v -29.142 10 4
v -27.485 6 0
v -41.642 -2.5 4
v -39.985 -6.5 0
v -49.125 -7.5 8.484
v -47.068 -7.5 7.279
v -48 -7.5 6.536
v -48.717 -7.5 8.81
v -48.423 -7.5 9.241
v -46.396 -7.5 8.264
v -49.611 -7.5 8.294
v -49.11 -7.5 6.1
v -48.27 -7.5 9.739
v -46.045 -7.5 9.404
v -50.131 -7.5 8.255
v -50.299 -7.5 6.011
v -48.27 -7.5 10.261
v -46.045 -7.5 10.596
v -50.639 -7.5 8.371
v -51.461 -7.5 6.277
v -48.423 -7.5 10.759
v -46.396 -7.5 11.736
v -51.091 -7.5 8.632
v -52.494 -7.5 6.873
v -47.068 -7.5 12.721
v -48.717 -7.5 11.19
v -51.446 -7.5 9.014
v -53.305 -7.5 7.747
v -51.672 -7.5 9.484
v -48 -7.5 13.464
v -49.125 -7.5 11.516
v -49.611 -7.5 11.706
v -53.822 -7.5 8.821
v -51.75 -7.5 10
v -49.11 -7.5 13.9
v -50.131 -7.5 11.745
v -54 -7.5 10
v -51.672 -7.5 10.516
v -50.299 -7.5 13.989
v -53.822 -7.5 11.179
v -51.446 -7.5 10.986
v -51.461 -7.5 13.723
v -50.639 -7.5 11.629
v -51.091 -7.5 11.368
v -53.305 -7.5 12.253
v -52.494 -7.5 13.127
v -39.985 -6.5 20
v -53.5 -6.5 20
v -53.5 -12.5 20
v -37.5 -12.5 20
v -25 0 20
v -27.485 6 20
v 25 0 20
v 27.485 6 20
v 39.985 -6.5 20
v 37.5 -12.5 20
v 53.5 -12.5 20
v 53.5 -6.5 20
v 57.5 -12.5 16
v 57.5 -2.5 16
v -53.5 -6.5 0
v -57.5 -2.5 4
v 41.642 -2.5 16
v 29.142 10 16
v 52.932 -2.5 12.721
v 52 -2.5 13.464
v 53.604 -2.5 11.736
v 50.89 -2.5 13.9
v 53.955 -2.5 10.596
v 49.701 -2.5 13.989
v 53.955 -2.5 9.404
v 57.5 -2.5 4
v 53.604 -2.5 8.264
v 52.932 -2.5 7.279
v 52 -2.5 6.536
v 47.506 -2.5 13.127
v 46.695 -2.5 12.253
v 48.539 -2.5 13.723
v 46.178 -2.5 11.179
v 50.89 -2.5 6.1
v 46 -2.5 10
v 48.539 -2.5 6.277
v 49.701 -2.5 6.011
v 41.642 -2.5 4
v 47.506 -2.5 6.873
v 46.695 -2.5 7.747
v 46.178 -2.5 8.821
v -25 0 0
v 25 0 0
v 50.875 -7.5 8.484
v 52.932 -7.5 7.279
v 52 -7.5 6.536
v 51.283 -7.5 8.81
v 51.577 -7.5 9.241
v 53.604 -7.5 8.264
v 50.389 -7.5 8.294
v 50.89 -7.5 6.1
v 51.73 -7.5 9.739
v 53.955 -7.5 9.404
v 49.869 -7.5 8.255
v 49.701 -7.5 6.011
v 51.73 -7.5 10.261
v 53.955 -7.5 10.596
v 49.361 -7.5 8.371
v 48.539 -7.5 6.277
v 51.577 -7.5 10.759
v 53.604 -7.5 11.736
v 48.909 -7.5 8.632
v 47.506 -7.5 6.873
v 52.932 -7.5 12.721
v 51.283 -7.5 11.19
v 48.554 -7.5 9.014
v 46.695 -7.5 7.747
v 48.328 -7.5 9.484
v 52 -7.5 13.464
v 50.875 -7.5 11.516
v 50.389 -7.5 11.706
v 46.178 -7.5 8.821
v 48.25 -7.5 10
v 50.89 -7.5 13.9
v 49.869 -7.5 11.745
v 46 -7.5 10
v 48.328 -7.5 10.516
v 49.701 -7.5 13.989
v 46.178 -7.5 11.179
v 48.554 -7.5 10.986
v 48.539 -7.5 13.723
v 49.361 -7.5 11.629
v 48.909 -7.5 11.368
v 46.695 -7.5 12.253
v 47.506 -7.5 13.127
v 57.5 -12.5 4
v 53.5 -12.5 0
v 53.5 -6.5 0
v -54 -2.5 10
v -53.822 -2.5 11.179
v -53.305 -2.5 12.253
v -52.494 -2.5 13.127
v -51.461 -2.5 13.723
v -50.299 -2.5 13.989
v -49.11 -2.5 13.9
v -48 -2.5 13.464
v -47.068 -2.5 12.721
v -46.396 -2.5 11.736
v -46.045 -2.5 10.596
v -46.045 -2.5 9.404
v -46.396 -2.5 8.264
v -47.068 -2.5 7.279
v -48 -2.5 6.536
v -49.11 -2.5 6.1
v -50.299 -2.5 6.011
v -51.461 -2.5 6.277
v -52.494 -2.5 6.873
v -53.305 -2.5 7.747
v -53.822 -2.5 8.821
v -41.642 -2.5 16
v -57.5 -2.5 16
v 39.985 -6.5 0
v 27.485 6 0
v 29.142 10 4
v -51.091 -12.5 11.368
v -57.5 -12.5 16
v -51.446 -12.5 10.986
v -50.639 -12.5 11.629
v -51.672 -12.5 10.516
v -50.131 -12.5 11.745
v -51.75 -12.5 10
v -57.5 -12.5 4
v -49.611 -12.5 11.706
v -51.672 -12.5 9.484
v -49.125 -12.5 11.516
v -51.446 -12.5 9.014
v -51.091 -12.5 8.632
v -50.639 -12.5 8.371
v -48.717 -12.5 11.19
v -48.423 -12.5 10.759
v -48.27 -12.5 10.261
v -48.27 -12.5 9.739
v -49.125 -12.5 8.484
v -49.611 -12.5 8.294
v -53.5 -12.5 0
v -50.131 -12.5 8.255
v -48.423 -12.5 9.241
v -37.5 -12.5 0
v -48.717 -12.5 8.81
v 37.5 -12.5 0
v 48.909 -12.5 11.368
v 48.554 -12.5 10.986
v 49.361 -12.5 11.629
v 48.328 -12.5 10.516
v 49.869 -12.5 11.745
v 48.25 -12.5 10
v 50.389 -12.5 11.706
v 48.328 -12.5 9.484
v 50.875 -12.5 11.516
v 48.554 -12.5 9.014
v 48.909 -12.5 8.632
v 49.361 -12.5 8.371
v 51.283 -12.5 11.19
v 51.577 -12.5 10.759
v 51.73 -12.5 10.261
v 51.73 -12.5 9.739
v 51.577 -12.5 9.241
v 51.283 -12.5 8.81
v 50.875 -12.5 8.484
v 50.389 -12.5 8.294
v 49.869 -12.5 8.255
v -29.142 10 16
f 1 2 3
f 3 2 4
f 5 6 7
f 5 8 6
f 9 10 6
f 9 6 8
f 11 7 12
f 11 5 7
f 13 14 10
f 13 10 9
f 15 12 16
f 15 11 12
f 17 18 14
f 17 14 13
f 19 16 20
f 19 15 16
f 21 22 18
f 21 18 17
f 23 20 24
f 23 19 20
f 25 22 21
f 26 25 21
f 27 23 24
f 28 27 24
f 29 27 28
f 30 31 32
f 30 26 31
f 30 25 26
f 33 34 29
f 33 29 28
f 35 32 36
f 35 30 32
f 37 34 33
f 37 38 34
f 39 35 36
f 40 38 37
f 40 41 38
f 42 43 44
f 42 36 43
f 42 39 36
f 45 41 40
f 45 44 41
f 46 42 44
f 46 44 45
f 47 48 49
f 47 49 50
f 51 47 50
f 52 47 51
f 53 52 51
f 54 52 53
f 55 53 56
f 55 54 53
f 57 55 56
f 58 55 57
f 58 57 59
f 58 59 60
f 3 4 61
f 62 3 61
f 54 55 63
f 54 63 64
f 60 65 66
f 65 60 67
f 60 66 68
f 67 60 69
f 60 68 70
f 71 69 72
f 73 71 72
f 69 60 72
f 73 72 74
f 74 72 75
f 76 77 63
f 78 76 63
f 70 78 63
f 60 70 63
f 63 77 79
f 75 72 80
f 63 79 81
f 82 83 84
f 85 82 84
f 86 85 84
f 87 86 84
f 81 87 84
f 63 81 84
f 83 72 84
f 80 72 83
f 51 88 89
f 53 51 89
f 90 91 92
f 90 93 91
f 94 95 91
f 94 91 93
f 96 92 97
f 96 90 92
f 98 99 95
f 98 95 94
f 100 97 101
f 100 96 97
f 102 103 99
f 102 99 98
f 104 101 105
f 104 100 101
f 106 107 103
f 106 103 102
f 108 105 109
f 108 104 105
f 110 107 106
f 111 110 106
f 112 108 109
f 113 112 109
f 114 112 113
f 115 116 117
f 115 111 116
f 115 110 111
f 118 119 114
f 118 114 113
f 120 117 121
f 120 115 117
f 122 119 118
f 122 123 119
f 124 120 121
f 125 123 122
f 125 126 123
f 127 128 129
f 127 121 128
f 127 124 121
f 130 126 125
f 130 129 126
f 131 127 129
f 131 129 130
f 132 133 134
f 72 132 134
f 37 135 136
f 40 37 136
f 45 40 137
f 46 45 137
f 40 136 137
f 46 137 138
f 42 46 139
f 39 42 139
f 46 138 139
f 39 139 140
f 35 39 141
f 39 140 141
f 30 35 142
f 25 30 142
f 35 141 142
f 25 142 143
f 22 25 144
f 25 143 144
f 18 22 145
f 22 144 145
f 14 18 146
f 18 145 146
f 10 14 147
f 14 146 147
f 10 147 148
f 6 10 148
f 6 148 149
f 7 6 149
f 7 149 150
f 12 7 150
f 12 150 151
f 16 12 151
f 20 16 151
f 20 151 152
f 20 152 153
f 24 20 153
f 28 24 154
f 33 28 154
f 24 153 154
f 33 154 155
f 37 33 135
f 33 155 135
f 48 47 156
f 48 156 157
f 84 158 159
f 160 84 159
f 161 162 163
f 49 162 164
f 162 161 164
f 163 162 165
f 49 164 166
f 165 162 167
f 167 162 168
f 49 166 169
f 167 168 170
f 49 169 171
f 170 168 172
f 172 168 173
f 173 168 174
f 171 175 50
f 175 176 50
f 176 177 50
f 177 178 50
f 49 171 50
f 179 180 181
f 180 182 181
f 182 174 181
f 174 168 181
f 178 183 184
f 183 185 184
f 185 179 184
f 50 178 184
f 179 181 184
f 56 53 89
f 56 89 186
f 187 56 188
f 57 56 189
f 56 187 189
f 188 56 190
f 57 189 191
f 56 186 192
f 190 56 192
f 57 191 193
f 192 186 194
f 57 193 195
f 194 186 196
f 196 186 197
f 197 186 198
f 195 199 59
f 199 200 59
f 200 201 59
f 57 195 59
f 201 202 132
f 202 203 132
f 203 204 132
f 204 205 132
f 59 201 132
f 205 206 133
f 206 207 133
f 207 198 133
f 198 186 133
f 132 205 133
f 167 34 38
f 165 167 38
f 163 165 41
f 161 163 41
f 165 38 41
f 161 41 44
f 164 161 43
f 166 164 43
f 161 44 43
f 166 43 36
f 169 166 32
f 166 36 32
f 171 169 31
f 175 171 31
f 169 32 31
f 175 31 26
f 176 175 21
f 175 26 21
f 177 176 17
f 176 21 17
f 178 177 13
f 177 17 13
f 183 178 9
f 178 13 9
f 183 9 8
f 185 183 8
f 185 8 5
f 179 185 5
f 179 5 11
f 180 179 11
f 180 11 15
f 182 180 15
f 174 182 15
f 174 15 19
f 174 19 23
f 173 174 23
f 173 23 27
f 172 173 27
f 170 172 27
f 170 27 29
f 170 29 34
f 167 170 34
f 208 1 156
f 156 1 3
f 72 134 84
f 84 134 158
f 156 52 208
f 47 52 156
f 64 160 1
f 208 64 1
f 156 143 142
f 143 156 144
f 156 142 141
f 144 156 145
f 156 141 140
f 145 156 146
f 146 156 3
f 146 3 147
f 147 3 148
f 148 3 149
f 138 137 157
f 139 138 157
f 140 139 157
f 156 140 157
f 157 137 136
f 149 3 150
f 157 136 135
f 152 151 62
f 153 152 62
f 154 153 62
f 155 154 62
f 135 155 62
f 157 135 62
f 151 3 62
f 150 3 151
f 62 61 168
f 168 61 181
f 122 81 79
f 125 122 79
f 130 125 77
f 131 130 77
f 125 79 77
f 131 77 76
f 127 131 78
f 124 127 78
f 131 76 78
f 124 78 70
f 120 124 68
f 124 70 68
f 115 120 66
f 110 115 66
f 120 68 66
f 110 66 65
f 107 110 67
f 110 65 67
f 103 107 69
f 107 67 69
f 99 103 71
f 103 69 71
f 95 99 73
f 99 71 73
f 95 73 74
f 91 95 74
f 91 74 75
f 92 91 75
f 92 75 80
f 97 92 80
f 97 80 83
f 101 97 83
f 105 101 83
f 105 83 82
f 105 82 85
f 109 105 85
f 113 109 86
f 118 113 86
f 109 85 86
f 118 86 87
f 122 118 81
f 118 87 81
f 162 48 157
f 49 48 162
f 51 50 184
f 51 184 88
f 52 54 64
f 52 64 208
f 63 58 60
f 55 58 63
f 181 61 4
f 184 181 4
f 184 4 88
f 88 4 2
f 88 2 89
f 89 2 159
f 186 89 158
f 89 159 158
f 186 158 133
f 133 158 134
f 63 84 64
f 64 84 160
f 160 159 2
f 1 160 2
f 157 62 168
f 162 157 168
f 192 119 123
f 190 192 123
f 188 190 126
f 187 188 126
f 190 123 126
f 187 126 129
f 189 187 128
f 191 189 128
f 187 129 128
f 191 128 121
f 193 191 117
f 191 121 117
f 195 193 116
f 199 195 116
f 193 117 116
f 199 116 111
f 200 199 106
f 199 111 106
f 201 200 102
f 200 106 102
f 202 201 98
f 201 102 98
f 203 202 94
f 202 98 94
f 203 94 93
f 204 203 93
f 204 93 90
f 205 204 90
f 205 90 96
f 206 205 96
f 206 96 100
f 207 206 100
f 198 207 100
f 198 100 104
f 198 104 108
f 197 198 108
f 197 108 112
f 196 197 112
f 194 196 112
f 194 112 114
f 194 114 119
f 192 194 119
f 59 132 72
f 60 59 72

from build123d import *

# Parameters (mm, degrees)
BOSS_EXTRUDE1_DEPTH = 20
CHAMFER1_SIZE       = 4
SKETCH2_R           = 1.75
CUT_EXTRUDE1_DEPTH  = 63.149014473
SKETCH3_R           = 4
CUT_EXTRUDE2_DEPTH  = 5


with BuildPart() as part:
    # Sketch1 → Boss-Extrude1 (new body)
    with BuildSketch(Plane.XY):
        Polygon((-25, 0), (25, 0), (37.5, -12.5), (57.5, -12.5), (57.5, -2.5), (41.642135624, -2.5), (29.142135624, 10), (-29.142135624, 10), (-41.642135624, -2.5), (-57.5, -2.5), (-57.5, -12.5), (-37.5, -12.5), align=None)
    extrude(amount=BOSS_EXTRUDE1_DEPTH)

    # Chamfer1
    chamfer1_edges = [part.edges().sort_by_distance(p)[0] for p in [
        (-57.5, -7.5, 0),
        (-49.571067812, -2.5, 0),
        (-35.392135624, 3.75, 0),
        (0, 10, 0),
        (35.392135624, 3.75, 0),
        (49.571067812, -2.5, 0),
        (57.5, -7.5, 0),
        (57.5, -7.5, 20),
        (49.571067812, -2.5, 20),
        (35.392135624, 3.75, 20),
        (0, 10, 20),
        (-35.392135624, 3.75, 20),
        (-49.571067812, -2.5, 20),
        (-57.5, -7.5, 20),
    ]]
    chamfer(chamfer1_edges, length=CHAMFER1_SIZE)

    # Sketch2 → Cut-Extrude1 (cut, through all)
    with BuildSketch(Plane(origin=(0, -2.5, 0), x_dir=(1, 0, 0), z_dir=(0, 1, 0))):
        with Locations(Location((-50, -10, 0), (0, 0, 180))):
            Circle(SKETCH2_R)
        with Locations(Location((50, -10, 0), (0, 0, 180))):
            Circle(SKETCH2_R)
    extrude(amount=-CUT_EXTRUDE1_DEPTH, mode=Mode.SUBTRACT)

    # Sketch3 → Cut-Extrude2 (cut)
    with BuildSketch(Plane(origin=(0, -2.5, 0), x_dir=(1, 0, 0), z_dir=(0, 1, 0))):
        with Locations(Location((-50, -10, 0), (0, 0, 180))):
            Circle(SKETCH3_R)
        with Locations(Location((50, -10, 0), (0, 0, 180))):
            Circle(SKETCH3_R)
    extrude(amount=-CUT_EXTRUDE2_DEPTH, mode=Mode.SUBTRACT)


solid = part.part
